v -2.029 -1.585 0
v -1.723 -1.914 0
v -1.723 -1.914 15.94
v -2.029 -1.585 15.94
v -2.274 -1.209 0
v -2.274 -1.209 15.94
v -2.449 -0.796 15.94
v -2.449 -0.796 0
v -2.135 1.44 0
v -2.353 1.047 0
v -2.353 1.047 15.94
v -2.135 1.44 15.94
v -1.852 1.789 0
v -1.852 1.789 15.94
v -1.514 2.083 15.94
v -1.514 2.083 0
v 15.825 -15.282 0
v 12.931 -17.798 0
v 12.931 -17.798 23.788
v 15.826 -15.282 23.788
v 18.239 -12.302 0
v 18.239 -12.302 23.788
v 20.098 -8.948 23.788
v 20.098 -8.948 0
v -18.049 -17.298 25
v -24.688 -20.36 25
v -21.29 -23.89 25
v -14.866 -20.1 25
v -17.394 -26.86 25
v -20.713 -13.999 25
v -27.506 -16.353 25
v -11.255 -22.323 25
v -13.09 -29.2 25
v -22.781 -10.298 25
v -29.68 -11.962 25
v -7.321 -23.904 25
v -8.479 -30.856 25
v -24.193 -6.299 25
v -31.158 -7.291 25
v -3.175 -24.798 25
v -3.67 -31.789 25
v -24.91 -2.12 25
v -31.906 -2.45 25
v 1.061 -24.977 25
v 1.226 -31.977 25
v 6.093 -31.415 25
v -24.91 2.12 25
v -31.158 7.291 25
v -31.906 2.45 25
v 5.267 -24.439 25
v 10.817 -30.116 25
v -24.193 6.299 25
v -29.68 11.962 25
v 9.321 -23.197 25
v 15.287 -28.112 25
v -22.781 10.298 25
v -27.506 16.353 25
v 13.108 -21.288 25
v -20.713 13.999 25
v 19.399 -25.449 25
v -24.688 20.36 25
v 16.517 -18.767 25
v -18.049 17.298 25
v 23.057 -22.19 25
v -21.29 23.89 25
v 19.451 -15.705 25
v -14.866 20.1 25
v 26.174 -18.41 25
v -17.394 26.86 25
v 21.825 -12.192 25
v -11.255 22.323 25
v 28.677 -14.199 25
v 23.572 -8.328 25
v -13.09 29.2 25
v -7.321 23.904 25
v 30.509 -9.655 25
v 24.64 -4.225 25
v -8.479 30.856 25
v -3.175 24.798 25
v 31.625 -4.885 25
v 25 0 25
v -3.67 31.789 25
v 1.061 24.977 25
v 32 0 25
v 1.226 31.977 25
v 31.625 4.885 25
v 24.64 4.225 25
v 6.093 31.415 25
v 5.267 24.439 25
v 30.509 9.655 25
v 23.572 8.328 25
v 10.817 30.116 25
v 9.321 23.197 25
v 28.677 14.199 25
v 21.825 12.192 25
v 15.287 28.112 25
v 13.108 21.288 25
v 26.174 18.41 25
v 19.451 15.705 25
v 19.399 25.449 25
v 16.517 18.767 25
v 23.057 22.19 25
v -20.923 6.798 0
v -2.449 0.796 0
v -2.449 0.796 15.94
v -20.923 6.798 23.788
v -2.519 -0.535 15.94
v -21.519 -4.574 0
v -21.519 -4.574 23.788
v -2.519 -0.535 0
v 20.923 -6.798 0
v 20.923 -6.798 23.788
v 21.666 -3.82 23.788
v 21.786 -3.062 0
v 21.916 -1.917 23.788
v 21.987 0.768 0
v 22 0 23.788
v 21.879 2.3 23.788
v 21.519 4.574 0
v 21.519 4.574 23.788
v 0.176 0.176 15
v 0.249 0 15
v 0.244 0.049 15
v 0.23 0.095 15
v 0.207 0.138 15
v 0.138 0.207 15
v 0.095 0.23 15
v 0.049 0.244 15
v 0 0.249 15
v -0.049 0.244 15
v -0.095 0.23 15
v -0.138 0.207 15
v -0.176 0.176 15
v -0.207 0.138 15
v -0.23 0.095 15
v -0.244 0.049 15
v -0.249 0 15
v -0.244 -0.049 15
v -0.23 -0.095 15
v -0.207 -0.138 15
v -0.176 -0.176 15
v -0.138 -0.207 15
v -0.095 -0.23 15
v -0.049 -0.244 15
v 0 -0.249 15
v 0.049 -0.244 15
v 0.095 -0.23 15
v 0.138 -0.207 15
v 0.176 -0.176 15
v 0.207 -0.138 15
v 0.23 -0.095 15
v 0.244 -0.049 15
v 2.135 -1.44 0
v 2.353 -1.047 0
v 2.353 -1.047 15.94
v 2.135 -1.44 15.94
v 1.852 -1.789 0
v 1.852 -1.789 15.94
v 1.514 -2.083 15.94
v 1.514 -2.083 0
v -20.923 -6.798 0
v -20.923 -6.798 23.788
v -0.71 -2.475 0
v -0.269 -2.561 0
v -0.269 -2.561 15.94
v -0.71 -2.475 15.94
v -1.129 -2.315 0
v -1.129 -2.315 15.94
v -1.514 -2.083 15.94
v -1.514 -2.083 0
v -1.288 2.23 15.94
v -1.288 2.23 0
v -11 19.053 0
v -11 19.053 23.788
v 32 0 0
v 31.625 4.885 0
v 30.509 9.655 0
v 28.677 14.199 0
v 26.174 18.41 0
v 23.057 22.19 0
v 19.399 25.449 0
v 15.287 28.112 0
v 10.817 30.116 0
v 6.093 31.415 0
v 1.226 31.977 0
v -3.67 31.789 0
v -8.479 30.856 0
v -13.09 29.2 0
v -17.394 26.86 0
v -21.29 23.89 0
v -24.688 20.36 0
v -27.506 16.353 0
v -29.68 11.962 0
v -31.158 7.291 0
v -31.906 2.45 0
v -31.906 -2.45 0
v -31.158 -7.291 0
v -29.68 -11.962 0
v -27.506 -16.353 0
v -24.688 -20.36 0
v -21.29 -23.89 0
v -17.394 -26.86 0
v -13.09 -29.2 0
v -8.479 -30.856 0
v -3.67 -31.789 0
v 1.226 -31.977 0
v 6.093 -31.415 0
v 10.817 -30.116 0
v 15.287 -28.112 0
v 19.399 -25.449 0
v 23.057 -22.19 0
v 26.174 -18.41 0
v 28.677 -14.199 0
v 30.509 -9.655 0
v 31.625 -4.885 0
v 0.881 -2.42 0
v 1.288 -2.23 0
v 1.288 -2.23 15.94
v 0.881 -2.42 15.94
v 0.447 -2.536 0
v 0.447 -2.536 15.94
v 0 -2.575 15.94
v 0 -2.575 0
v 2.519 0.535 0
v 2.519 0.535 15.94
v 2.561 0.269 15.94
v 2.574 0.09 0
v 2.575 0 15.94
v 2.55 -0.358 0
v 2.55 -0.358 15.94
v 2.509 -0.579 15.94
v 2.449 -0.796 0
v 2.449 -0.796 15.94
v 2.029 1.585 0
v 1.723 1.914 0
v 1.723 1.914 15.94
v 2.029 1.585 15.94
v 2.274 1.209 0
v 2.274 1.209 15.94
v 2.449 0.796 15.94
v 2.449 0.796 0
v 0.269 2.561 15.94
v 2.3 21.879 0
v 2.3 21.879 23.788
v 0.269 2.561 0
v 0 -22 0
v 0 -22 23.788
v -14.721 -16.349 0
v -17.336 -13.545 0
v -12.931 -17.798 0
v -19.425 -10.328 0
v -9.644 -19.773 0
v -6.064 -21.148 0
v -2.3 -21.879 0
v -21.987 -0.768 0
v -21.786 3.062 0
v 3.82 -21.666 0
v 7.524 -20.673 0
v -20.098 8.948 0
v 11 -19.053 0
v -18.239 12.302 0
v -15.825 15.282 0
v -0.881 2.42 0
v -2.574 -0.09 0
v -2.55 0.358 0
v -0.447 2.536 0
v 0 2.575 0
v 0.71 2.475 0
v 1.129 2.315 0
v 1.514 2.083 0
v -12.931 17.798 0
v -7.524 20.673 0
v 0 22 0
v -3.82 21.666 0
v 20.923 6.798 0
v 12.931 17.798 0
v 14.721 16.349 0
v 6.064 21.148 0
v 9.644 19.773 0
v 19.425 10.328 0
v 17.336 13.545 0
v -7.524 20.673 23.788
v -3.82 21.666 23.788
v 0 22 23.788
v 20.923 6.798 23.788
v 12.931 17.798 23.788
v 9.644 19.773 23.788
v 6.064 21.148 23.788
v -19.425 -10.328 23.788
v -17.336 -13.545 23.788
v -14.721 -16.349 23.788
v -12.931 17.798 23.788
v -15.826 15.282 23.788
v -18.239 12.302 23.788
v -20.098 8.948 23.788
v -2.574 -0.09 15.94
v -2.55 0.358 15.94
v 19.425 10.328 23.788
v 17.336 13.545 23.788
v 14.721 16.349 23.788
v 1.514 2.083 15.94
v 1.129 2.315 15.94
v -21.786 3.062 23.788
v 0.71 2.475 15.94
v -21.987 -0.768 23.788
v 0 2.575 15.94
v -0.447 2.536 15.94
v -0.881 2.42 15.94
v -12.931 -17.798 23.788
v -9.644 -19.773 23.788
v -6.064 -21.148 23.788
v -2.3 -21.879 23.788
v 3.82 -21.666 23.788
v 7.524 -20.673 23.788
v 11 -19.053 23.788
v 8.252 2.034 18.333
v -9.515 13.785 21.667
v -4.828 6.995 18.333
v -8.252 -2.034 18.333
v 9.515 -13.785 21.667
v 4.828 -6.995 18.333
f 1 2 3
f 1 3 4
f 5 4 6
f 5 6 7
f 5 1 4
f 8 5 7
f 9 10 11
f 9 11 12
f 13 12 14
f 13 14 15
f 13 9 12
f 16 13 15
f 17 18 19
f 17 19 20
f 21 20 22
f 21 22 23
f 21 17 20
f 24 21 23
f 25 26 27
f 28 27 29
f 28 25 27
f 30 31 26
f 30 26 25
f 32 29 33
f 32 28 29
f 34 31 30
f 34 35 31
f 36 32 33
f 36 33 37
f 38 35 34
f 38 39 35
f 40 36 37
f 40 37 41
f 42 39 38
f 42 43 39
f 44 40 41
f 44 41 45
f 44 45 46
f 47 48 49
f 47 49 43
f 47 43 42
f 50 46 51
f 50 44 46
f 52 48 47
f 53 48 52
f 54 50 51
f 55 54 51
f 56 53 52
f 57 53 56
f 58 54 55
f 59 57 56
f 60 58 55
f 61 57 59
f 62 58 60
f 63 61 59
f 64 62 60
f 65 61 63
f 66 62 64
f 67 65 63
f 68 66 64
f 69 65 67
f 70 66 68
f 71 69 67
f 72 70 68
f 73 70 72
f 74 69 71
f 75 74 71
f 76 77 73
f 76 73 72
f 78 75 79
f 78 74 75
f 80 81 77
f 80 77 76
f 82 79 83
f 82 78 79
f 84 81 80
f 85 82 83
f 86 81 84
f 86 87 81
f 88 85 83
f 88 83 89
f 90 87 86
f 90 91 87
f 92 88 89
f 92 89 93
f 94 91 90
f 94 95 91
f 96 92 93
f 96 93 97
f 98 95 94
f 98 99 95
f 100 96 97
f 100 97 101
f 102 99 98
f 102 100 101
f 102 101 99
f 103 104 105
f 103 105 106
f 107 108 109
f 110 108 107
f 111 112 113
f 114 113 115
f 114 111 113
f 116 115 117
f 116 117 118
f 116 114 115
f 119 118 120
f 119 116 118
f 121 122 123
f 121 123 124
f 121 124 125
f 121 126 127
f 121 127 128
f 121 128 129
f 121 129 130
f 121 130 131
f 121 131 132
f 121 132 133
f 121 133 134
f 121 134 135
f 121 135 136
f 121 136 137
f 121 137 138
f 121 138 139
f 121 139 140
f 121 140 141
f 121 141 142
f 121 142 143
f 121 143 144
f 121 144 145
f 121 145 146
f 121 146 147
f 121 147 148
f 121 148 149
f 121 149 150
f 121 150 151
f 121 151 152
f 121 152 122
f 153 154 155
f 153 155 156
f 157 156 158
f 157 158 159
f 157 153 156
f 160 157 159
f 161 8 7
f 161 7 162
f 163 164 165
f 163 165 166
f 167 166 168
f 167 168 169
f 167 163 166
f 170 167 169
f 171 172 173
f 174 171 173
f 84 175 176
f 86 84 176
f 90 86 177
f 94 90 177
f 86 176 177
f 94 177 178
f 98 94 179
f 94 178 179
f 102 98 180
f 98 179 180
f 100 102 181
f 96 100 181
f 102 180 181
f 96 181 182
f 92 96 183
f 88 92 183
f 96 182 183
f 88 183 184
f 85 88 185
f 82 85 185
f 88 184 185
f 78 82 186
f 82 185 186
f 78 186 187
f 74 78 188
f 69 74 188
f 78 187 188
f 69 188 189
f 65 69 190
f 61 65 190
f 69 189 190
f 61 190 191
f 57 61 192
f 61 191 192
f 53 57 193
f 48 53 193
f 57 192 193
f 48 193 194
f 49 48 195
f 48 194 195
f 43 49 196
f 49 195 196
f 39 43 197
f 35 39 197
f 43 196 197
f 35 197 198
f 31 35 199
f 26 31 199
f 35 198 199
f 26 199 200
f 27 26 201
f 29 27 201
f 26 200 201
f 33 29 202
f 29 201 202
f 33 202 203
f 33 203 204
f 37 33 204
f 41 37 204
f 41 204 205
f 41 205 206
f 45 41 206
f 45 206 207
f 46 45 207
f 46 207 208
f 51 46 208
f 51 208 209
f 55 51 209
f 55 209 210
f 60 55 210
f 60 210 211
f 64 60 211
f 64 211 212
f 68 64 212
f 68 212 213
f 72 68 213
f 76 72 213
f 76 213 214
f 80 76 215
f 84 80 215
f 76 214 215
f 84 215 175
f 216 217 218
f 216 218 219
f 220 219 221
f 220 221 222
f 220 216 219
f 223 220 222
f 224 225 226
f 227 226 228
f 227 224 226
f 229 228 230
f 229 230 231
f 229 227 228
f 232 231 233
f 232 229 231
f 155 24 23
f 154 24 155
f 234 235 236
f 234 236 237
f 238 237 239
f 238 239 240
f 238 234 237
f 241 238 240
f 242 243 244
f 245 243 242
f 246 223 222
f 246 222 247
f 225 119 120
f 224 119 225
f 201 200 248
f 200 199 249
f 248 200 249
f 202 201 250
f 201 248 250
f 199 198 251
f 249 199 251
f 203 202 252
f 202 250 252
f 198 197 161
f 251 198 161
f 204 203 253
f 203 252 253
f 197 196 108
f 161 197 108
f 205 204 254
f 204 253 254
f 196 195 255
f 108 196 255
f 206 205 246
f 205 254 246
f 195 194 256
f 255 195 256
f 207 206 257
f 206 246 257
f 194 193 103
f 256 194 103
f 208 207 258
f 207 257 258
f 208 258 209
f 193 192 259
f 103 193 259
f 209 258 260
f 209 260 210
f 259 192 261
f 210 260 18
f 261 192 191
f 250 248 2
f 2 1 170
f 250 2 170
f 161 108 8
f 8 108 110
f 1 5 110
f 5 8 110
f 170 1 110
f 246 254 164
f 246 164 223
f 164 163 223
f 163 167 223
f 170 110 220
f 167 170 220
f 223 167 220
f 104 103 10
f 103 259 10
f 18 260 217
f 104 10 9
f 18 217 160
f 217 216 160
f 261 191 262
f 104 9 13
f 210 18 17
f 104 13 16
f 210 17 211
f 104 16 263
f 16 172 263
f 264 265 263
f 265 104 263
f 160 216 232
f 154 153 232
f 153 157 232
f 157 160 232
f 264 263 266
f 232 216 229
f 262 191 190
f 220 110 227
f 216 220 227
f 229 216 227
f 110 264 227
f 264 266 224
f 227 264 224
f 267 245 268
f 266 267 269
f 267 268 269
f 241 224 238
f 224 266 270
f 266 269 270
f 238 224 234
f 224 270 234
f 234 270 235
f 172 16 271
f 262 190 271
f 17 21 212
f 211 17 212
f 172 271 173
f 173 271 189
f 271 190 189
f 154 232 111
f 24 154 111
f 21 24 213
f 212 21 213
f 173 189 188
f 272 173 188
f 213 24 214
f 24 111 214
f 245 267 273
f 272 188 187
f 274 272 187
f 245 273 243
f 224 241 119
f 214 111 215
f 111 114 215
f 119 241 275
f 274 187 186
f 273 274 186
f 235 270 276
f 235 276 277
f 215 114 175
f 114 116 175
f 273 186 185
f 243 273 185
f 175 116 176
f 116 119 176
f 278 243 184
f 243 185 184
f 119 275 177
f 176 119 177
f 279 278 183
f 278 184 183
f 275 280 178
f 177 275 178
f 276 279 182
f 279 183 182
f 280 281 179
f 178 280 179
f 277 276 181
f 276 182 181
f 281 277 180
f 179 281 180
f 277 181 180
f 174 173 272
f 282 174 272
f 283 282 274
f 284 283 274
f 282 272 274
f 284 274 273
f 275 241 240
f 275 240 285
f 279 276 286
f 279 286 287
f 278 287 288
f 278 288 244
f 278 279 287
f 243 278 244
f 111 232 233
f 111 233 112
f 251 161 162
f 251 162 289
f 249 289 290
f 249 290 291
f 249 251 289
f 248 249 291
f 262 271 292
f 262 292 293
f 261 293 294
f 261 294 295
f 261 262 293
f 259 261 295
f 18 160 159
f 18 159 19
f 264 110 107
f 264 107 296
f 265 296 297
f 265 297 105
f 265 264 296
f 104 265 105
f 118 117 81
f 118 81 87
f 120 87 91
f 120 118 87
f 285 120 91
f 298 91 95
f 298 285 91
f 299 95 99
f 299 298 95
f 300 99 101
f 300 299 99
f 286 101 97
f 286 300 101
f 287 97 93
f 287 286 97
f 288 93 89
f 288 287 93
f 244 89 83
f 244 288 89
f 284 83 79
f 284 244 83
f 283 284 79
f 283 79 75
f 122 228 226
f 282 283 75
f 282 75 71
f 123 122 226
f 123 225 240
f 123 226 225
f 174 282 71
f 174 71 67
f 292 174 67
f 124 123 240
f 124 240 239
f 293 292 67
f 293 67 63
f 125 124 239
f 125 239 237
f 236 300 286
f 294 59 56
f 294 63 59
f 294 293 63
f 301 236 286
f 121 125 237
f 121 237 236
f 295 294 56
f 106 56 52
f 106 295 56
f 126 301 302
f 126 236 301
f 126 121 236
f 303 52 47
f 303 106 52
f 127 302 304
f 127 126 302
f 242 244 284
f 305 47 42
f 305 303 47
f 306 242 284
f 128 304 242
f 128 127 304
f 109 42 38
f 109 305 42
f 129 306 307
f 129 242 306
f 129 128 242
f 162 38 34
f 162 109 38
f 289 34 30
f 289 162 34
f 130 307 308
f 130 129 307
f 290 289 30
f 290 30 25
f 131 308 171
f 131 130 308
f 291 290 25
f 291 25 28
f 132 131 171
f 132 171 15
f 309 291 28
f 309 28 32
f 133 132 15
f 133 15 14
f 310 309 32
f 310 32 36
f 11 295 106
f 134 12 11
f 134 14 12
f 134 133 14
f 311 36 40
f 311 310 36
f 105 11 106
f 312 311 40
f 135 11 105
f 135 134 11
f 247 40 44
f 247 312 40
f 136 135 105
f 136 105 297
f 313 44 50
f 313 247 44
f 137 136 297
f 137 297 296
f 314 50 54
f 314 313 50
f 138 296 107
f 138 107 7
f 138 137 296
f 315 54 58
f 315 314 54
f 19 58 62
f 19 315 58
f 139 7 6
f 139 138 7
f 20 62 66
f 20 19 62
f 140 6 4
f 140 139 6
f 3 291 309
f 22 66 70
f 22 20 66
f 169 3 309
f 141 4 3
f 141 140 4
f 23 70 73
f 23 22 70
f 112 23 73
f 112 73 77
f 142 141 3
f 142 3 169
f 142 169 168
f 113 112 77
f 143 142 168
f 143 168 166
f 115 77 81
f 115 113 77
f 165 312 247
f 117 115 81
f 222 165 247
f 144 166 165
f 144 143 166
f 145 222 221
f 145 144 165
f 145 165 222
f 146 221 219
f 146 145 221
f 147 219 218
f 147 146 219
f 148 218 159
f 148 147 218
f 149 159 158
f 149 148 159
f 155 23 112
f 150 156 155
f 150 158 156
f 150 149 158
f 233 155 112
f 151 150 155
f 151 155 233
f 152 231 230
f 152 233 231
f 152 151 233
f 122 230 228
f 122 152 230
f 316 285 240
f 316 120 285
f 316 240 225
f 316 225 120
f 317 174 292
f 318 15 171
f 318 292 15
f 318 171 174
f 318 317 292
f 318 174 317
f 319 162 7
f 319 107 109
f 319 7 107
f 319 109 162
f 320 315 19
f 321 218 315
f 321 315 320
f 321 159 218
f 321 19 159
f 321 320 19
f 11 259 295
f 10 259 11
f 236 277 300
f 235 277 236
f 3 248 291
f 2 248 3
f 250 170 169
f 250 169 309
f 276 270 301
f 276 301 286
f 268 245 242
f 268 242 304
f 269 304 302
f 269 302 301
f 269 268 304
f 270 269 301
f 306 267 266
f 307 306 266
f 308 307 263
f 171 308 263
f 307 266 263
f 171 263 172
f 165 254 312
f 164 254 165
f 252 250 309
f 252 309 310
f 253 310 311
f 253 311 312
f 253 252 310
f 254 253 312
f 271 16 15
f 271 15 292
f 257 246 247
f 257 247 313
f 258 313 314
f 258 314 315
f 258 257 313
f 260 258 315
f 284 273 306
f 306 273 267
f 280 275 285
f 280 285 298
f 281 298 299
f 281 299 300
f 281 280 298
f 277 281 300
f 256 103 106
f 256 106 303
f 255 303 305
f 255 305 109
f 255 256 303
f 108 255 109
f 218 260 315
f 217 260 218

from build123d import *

# Parameters (mm, degrees)
SKETCH_1_R          = 32
EXTRUDE_1_DEPTH     = 25
SKETCH_2_R          = 25
CUT_EXTRUDE_1_DEPTH = 10
CUT_EXTRUDE_1_TAPER = 68
CUT_EXTRUDE_6_DEPTH = 50


with BuildPart() as part:
    # 스케치1 → 보스-돌출1 (new body)
    with BuildSketch(Plane.XY):
        Circle(SKETCH_1_R)
    extrude(amount=EXTRUDE_1_DEPTH)

    # 스케치2 → 컷-돌출1 (cut)
    with BuildSketch(Plane.XY.offset(25)):
        Circle(SKETCH_2_R)
    extrude(amount=-CUT_EXTRUDE_1_DEPTH, taper=CUT_EXTRUDE_1_TAPER, mode=Mode.SUBTRACT)

    # 스케치4 → 컷-돌출6 (cut)
    with BuildSketch(Plane(origin=(0, 0, 0), x_dir=(-1, 0, 0), z_dir=(0, 0, -1))):
        with BuildLine():
            Line((0, 22), (0, 2.575144905))
            ThreePointArc((0, 2.575144905), (0.666496545, 2.48739897), (1.287572453, 2.230140906))
            Line((1.287572453, 2.230140906), (11, 19.052558883))
            ThreePointArc((11, 19.052558883), (5.694018992, 21.250368178), (0, 22))
        make_face()
        with BuildLine():
            Line((20.098000068, 8.948206148), (2.352511931, 1.047405794))
            ThreePointArc((2.352511931, 1.047405794), (2.001263463, 1.620591199), (1.513632198, 2.083335991))
            Line((1.513632198, 2.083335991), (12.93127555, 17.798373876))
            ThreePointArc((12.93127555, 17.798373876), (17.097211152, 13.845048603), (20.098000068, 8.948206148))
        make_face()
        with BuildLine():
            Line((21.519247216, -4.574057198), (2.51887181, -0.535402731))
            ThreePointArc((2.51887181, -0.535402731), (2.571615758, 0.134772671), (2.449108342, 0.795763539))
            Line((2.449108342, 0.795763539), (20.923243358, 6.798373876))
            ThreePointArc((20.923243358, 6.798373876), (21.969849765, 1.151391037), (21.519247216, -4.574057198))
        make_face()
        with BuildLine():
            Line((14.72087334, -16.349186161), (1.723108272, -1.913705611))
            ThreePointArc((1.723108272, -1.913705611), (2.15969824, -1.402524436), (2.449108342, -0.795763539))
            Line((2.449108342, -0.795763539), (20.923243358, -6.798373876))
            ThreePointArc((20.923243358, -6.798373876), (18.450752495, -11.98205877), (14.72087334, -16.349186161))
        make_face()
        with BuildLine():
            Line((2.299626192, -21.879481698), (0.26917594, -2.561037992))
            ThreePointArc((0.26917594, -2.561037992), (0.922849399, -2.404104879), (1.513632198, -2.083335991))
            Line((1.513632198, -2.083335991), (12.93127555, -17.798373876))
            ThreePointArc((12.93127555, -17.798373876), (7.88409489, -20.538769383), (2.299626192, -21.879481698))
        make_face()
        with BuildLine():
            Line((-11, -19.052558883), (-1.287572453, -2.230140906))
            ThreePointArc((-1.287572453, -2.230140906), (-0.666496545, -2.48739897), (0, -2.575144905))
            Line((0, -2.575144905), (0, -22))
            ThreePointArc((0, -22), (-5.694018992, -21.250368178), (-11, -19.052558883))
        make_face()
        with BuildLine():
            Line((-20.098000068, -8.948206148), (-2.352511931, -1.047405794))
            ThreePointArc((-2.352511931, -1.047405794), (-2.001263463, -1.620591199), (-1.513632198, -2.083335991))
            Line((-1.513632198, -2.083335991), (-12.93127555, -17.798373876))
            ThreePointArc((-12.93127555, -17.798373876), (-17.097211152, -13.845048603), (-20.098000068, -8.948206148))
        make_face()
        with BuildLine():
            Line((-21.519247216, 4.574057198), (-2.51887181, 0.535402731))
            ThreePointArc((-2.51887181, 0.535402731), (-2.571615758, -0.134772671), (-2.449108342, -0.795763539))
            Line((-2.449108342, -0.795763539), (-20.923243358, -6.798373876))
            ThreePointArc((-20.923243358, -6.798373876), (-21.969849765, -1.151391037), (-21.519247216, 4.574057198))
        make_face()
        with BuildLine():
            Line((-14.72087334, 16.349186161), (-1.723108272, 1.913705611))
            ThreePointArc((-1.723108272, 1.913705611), (-2.15969824, 1.402524436), (-2.449108342, 0.795763539))
            Line((-2.449108342, 0.795763539), (-20.923243358, 6.798373876))
            ThreePointArc((-20.923243358, 6.798373876), (-18.450752495, 11.98205877), (-14.72087334, 16.349186161))
        make_face()
        with BuildLine():
            Line((-2.299626192, 21.879481698), (-0.26917594, 2.561037992))
            ThreePointArc((-0.26917594, 2.561037992), (-0.922849399, 2.404104879), (-1.513632198, 2.083335991))
            Line((-1.513632198, 2.083335991), (-12.93127555, 17.798373876))
            ThreePointArc((-12.93127555, 17.798373876), (-7.88409489, 20.538769383), (-2.299626192, 21.879481698))
        make_face()
    extrude(amount=-CUT_EXTRUDE_6_DEPTH, mode=Mode.SUBTRACT)


solid = part.part
